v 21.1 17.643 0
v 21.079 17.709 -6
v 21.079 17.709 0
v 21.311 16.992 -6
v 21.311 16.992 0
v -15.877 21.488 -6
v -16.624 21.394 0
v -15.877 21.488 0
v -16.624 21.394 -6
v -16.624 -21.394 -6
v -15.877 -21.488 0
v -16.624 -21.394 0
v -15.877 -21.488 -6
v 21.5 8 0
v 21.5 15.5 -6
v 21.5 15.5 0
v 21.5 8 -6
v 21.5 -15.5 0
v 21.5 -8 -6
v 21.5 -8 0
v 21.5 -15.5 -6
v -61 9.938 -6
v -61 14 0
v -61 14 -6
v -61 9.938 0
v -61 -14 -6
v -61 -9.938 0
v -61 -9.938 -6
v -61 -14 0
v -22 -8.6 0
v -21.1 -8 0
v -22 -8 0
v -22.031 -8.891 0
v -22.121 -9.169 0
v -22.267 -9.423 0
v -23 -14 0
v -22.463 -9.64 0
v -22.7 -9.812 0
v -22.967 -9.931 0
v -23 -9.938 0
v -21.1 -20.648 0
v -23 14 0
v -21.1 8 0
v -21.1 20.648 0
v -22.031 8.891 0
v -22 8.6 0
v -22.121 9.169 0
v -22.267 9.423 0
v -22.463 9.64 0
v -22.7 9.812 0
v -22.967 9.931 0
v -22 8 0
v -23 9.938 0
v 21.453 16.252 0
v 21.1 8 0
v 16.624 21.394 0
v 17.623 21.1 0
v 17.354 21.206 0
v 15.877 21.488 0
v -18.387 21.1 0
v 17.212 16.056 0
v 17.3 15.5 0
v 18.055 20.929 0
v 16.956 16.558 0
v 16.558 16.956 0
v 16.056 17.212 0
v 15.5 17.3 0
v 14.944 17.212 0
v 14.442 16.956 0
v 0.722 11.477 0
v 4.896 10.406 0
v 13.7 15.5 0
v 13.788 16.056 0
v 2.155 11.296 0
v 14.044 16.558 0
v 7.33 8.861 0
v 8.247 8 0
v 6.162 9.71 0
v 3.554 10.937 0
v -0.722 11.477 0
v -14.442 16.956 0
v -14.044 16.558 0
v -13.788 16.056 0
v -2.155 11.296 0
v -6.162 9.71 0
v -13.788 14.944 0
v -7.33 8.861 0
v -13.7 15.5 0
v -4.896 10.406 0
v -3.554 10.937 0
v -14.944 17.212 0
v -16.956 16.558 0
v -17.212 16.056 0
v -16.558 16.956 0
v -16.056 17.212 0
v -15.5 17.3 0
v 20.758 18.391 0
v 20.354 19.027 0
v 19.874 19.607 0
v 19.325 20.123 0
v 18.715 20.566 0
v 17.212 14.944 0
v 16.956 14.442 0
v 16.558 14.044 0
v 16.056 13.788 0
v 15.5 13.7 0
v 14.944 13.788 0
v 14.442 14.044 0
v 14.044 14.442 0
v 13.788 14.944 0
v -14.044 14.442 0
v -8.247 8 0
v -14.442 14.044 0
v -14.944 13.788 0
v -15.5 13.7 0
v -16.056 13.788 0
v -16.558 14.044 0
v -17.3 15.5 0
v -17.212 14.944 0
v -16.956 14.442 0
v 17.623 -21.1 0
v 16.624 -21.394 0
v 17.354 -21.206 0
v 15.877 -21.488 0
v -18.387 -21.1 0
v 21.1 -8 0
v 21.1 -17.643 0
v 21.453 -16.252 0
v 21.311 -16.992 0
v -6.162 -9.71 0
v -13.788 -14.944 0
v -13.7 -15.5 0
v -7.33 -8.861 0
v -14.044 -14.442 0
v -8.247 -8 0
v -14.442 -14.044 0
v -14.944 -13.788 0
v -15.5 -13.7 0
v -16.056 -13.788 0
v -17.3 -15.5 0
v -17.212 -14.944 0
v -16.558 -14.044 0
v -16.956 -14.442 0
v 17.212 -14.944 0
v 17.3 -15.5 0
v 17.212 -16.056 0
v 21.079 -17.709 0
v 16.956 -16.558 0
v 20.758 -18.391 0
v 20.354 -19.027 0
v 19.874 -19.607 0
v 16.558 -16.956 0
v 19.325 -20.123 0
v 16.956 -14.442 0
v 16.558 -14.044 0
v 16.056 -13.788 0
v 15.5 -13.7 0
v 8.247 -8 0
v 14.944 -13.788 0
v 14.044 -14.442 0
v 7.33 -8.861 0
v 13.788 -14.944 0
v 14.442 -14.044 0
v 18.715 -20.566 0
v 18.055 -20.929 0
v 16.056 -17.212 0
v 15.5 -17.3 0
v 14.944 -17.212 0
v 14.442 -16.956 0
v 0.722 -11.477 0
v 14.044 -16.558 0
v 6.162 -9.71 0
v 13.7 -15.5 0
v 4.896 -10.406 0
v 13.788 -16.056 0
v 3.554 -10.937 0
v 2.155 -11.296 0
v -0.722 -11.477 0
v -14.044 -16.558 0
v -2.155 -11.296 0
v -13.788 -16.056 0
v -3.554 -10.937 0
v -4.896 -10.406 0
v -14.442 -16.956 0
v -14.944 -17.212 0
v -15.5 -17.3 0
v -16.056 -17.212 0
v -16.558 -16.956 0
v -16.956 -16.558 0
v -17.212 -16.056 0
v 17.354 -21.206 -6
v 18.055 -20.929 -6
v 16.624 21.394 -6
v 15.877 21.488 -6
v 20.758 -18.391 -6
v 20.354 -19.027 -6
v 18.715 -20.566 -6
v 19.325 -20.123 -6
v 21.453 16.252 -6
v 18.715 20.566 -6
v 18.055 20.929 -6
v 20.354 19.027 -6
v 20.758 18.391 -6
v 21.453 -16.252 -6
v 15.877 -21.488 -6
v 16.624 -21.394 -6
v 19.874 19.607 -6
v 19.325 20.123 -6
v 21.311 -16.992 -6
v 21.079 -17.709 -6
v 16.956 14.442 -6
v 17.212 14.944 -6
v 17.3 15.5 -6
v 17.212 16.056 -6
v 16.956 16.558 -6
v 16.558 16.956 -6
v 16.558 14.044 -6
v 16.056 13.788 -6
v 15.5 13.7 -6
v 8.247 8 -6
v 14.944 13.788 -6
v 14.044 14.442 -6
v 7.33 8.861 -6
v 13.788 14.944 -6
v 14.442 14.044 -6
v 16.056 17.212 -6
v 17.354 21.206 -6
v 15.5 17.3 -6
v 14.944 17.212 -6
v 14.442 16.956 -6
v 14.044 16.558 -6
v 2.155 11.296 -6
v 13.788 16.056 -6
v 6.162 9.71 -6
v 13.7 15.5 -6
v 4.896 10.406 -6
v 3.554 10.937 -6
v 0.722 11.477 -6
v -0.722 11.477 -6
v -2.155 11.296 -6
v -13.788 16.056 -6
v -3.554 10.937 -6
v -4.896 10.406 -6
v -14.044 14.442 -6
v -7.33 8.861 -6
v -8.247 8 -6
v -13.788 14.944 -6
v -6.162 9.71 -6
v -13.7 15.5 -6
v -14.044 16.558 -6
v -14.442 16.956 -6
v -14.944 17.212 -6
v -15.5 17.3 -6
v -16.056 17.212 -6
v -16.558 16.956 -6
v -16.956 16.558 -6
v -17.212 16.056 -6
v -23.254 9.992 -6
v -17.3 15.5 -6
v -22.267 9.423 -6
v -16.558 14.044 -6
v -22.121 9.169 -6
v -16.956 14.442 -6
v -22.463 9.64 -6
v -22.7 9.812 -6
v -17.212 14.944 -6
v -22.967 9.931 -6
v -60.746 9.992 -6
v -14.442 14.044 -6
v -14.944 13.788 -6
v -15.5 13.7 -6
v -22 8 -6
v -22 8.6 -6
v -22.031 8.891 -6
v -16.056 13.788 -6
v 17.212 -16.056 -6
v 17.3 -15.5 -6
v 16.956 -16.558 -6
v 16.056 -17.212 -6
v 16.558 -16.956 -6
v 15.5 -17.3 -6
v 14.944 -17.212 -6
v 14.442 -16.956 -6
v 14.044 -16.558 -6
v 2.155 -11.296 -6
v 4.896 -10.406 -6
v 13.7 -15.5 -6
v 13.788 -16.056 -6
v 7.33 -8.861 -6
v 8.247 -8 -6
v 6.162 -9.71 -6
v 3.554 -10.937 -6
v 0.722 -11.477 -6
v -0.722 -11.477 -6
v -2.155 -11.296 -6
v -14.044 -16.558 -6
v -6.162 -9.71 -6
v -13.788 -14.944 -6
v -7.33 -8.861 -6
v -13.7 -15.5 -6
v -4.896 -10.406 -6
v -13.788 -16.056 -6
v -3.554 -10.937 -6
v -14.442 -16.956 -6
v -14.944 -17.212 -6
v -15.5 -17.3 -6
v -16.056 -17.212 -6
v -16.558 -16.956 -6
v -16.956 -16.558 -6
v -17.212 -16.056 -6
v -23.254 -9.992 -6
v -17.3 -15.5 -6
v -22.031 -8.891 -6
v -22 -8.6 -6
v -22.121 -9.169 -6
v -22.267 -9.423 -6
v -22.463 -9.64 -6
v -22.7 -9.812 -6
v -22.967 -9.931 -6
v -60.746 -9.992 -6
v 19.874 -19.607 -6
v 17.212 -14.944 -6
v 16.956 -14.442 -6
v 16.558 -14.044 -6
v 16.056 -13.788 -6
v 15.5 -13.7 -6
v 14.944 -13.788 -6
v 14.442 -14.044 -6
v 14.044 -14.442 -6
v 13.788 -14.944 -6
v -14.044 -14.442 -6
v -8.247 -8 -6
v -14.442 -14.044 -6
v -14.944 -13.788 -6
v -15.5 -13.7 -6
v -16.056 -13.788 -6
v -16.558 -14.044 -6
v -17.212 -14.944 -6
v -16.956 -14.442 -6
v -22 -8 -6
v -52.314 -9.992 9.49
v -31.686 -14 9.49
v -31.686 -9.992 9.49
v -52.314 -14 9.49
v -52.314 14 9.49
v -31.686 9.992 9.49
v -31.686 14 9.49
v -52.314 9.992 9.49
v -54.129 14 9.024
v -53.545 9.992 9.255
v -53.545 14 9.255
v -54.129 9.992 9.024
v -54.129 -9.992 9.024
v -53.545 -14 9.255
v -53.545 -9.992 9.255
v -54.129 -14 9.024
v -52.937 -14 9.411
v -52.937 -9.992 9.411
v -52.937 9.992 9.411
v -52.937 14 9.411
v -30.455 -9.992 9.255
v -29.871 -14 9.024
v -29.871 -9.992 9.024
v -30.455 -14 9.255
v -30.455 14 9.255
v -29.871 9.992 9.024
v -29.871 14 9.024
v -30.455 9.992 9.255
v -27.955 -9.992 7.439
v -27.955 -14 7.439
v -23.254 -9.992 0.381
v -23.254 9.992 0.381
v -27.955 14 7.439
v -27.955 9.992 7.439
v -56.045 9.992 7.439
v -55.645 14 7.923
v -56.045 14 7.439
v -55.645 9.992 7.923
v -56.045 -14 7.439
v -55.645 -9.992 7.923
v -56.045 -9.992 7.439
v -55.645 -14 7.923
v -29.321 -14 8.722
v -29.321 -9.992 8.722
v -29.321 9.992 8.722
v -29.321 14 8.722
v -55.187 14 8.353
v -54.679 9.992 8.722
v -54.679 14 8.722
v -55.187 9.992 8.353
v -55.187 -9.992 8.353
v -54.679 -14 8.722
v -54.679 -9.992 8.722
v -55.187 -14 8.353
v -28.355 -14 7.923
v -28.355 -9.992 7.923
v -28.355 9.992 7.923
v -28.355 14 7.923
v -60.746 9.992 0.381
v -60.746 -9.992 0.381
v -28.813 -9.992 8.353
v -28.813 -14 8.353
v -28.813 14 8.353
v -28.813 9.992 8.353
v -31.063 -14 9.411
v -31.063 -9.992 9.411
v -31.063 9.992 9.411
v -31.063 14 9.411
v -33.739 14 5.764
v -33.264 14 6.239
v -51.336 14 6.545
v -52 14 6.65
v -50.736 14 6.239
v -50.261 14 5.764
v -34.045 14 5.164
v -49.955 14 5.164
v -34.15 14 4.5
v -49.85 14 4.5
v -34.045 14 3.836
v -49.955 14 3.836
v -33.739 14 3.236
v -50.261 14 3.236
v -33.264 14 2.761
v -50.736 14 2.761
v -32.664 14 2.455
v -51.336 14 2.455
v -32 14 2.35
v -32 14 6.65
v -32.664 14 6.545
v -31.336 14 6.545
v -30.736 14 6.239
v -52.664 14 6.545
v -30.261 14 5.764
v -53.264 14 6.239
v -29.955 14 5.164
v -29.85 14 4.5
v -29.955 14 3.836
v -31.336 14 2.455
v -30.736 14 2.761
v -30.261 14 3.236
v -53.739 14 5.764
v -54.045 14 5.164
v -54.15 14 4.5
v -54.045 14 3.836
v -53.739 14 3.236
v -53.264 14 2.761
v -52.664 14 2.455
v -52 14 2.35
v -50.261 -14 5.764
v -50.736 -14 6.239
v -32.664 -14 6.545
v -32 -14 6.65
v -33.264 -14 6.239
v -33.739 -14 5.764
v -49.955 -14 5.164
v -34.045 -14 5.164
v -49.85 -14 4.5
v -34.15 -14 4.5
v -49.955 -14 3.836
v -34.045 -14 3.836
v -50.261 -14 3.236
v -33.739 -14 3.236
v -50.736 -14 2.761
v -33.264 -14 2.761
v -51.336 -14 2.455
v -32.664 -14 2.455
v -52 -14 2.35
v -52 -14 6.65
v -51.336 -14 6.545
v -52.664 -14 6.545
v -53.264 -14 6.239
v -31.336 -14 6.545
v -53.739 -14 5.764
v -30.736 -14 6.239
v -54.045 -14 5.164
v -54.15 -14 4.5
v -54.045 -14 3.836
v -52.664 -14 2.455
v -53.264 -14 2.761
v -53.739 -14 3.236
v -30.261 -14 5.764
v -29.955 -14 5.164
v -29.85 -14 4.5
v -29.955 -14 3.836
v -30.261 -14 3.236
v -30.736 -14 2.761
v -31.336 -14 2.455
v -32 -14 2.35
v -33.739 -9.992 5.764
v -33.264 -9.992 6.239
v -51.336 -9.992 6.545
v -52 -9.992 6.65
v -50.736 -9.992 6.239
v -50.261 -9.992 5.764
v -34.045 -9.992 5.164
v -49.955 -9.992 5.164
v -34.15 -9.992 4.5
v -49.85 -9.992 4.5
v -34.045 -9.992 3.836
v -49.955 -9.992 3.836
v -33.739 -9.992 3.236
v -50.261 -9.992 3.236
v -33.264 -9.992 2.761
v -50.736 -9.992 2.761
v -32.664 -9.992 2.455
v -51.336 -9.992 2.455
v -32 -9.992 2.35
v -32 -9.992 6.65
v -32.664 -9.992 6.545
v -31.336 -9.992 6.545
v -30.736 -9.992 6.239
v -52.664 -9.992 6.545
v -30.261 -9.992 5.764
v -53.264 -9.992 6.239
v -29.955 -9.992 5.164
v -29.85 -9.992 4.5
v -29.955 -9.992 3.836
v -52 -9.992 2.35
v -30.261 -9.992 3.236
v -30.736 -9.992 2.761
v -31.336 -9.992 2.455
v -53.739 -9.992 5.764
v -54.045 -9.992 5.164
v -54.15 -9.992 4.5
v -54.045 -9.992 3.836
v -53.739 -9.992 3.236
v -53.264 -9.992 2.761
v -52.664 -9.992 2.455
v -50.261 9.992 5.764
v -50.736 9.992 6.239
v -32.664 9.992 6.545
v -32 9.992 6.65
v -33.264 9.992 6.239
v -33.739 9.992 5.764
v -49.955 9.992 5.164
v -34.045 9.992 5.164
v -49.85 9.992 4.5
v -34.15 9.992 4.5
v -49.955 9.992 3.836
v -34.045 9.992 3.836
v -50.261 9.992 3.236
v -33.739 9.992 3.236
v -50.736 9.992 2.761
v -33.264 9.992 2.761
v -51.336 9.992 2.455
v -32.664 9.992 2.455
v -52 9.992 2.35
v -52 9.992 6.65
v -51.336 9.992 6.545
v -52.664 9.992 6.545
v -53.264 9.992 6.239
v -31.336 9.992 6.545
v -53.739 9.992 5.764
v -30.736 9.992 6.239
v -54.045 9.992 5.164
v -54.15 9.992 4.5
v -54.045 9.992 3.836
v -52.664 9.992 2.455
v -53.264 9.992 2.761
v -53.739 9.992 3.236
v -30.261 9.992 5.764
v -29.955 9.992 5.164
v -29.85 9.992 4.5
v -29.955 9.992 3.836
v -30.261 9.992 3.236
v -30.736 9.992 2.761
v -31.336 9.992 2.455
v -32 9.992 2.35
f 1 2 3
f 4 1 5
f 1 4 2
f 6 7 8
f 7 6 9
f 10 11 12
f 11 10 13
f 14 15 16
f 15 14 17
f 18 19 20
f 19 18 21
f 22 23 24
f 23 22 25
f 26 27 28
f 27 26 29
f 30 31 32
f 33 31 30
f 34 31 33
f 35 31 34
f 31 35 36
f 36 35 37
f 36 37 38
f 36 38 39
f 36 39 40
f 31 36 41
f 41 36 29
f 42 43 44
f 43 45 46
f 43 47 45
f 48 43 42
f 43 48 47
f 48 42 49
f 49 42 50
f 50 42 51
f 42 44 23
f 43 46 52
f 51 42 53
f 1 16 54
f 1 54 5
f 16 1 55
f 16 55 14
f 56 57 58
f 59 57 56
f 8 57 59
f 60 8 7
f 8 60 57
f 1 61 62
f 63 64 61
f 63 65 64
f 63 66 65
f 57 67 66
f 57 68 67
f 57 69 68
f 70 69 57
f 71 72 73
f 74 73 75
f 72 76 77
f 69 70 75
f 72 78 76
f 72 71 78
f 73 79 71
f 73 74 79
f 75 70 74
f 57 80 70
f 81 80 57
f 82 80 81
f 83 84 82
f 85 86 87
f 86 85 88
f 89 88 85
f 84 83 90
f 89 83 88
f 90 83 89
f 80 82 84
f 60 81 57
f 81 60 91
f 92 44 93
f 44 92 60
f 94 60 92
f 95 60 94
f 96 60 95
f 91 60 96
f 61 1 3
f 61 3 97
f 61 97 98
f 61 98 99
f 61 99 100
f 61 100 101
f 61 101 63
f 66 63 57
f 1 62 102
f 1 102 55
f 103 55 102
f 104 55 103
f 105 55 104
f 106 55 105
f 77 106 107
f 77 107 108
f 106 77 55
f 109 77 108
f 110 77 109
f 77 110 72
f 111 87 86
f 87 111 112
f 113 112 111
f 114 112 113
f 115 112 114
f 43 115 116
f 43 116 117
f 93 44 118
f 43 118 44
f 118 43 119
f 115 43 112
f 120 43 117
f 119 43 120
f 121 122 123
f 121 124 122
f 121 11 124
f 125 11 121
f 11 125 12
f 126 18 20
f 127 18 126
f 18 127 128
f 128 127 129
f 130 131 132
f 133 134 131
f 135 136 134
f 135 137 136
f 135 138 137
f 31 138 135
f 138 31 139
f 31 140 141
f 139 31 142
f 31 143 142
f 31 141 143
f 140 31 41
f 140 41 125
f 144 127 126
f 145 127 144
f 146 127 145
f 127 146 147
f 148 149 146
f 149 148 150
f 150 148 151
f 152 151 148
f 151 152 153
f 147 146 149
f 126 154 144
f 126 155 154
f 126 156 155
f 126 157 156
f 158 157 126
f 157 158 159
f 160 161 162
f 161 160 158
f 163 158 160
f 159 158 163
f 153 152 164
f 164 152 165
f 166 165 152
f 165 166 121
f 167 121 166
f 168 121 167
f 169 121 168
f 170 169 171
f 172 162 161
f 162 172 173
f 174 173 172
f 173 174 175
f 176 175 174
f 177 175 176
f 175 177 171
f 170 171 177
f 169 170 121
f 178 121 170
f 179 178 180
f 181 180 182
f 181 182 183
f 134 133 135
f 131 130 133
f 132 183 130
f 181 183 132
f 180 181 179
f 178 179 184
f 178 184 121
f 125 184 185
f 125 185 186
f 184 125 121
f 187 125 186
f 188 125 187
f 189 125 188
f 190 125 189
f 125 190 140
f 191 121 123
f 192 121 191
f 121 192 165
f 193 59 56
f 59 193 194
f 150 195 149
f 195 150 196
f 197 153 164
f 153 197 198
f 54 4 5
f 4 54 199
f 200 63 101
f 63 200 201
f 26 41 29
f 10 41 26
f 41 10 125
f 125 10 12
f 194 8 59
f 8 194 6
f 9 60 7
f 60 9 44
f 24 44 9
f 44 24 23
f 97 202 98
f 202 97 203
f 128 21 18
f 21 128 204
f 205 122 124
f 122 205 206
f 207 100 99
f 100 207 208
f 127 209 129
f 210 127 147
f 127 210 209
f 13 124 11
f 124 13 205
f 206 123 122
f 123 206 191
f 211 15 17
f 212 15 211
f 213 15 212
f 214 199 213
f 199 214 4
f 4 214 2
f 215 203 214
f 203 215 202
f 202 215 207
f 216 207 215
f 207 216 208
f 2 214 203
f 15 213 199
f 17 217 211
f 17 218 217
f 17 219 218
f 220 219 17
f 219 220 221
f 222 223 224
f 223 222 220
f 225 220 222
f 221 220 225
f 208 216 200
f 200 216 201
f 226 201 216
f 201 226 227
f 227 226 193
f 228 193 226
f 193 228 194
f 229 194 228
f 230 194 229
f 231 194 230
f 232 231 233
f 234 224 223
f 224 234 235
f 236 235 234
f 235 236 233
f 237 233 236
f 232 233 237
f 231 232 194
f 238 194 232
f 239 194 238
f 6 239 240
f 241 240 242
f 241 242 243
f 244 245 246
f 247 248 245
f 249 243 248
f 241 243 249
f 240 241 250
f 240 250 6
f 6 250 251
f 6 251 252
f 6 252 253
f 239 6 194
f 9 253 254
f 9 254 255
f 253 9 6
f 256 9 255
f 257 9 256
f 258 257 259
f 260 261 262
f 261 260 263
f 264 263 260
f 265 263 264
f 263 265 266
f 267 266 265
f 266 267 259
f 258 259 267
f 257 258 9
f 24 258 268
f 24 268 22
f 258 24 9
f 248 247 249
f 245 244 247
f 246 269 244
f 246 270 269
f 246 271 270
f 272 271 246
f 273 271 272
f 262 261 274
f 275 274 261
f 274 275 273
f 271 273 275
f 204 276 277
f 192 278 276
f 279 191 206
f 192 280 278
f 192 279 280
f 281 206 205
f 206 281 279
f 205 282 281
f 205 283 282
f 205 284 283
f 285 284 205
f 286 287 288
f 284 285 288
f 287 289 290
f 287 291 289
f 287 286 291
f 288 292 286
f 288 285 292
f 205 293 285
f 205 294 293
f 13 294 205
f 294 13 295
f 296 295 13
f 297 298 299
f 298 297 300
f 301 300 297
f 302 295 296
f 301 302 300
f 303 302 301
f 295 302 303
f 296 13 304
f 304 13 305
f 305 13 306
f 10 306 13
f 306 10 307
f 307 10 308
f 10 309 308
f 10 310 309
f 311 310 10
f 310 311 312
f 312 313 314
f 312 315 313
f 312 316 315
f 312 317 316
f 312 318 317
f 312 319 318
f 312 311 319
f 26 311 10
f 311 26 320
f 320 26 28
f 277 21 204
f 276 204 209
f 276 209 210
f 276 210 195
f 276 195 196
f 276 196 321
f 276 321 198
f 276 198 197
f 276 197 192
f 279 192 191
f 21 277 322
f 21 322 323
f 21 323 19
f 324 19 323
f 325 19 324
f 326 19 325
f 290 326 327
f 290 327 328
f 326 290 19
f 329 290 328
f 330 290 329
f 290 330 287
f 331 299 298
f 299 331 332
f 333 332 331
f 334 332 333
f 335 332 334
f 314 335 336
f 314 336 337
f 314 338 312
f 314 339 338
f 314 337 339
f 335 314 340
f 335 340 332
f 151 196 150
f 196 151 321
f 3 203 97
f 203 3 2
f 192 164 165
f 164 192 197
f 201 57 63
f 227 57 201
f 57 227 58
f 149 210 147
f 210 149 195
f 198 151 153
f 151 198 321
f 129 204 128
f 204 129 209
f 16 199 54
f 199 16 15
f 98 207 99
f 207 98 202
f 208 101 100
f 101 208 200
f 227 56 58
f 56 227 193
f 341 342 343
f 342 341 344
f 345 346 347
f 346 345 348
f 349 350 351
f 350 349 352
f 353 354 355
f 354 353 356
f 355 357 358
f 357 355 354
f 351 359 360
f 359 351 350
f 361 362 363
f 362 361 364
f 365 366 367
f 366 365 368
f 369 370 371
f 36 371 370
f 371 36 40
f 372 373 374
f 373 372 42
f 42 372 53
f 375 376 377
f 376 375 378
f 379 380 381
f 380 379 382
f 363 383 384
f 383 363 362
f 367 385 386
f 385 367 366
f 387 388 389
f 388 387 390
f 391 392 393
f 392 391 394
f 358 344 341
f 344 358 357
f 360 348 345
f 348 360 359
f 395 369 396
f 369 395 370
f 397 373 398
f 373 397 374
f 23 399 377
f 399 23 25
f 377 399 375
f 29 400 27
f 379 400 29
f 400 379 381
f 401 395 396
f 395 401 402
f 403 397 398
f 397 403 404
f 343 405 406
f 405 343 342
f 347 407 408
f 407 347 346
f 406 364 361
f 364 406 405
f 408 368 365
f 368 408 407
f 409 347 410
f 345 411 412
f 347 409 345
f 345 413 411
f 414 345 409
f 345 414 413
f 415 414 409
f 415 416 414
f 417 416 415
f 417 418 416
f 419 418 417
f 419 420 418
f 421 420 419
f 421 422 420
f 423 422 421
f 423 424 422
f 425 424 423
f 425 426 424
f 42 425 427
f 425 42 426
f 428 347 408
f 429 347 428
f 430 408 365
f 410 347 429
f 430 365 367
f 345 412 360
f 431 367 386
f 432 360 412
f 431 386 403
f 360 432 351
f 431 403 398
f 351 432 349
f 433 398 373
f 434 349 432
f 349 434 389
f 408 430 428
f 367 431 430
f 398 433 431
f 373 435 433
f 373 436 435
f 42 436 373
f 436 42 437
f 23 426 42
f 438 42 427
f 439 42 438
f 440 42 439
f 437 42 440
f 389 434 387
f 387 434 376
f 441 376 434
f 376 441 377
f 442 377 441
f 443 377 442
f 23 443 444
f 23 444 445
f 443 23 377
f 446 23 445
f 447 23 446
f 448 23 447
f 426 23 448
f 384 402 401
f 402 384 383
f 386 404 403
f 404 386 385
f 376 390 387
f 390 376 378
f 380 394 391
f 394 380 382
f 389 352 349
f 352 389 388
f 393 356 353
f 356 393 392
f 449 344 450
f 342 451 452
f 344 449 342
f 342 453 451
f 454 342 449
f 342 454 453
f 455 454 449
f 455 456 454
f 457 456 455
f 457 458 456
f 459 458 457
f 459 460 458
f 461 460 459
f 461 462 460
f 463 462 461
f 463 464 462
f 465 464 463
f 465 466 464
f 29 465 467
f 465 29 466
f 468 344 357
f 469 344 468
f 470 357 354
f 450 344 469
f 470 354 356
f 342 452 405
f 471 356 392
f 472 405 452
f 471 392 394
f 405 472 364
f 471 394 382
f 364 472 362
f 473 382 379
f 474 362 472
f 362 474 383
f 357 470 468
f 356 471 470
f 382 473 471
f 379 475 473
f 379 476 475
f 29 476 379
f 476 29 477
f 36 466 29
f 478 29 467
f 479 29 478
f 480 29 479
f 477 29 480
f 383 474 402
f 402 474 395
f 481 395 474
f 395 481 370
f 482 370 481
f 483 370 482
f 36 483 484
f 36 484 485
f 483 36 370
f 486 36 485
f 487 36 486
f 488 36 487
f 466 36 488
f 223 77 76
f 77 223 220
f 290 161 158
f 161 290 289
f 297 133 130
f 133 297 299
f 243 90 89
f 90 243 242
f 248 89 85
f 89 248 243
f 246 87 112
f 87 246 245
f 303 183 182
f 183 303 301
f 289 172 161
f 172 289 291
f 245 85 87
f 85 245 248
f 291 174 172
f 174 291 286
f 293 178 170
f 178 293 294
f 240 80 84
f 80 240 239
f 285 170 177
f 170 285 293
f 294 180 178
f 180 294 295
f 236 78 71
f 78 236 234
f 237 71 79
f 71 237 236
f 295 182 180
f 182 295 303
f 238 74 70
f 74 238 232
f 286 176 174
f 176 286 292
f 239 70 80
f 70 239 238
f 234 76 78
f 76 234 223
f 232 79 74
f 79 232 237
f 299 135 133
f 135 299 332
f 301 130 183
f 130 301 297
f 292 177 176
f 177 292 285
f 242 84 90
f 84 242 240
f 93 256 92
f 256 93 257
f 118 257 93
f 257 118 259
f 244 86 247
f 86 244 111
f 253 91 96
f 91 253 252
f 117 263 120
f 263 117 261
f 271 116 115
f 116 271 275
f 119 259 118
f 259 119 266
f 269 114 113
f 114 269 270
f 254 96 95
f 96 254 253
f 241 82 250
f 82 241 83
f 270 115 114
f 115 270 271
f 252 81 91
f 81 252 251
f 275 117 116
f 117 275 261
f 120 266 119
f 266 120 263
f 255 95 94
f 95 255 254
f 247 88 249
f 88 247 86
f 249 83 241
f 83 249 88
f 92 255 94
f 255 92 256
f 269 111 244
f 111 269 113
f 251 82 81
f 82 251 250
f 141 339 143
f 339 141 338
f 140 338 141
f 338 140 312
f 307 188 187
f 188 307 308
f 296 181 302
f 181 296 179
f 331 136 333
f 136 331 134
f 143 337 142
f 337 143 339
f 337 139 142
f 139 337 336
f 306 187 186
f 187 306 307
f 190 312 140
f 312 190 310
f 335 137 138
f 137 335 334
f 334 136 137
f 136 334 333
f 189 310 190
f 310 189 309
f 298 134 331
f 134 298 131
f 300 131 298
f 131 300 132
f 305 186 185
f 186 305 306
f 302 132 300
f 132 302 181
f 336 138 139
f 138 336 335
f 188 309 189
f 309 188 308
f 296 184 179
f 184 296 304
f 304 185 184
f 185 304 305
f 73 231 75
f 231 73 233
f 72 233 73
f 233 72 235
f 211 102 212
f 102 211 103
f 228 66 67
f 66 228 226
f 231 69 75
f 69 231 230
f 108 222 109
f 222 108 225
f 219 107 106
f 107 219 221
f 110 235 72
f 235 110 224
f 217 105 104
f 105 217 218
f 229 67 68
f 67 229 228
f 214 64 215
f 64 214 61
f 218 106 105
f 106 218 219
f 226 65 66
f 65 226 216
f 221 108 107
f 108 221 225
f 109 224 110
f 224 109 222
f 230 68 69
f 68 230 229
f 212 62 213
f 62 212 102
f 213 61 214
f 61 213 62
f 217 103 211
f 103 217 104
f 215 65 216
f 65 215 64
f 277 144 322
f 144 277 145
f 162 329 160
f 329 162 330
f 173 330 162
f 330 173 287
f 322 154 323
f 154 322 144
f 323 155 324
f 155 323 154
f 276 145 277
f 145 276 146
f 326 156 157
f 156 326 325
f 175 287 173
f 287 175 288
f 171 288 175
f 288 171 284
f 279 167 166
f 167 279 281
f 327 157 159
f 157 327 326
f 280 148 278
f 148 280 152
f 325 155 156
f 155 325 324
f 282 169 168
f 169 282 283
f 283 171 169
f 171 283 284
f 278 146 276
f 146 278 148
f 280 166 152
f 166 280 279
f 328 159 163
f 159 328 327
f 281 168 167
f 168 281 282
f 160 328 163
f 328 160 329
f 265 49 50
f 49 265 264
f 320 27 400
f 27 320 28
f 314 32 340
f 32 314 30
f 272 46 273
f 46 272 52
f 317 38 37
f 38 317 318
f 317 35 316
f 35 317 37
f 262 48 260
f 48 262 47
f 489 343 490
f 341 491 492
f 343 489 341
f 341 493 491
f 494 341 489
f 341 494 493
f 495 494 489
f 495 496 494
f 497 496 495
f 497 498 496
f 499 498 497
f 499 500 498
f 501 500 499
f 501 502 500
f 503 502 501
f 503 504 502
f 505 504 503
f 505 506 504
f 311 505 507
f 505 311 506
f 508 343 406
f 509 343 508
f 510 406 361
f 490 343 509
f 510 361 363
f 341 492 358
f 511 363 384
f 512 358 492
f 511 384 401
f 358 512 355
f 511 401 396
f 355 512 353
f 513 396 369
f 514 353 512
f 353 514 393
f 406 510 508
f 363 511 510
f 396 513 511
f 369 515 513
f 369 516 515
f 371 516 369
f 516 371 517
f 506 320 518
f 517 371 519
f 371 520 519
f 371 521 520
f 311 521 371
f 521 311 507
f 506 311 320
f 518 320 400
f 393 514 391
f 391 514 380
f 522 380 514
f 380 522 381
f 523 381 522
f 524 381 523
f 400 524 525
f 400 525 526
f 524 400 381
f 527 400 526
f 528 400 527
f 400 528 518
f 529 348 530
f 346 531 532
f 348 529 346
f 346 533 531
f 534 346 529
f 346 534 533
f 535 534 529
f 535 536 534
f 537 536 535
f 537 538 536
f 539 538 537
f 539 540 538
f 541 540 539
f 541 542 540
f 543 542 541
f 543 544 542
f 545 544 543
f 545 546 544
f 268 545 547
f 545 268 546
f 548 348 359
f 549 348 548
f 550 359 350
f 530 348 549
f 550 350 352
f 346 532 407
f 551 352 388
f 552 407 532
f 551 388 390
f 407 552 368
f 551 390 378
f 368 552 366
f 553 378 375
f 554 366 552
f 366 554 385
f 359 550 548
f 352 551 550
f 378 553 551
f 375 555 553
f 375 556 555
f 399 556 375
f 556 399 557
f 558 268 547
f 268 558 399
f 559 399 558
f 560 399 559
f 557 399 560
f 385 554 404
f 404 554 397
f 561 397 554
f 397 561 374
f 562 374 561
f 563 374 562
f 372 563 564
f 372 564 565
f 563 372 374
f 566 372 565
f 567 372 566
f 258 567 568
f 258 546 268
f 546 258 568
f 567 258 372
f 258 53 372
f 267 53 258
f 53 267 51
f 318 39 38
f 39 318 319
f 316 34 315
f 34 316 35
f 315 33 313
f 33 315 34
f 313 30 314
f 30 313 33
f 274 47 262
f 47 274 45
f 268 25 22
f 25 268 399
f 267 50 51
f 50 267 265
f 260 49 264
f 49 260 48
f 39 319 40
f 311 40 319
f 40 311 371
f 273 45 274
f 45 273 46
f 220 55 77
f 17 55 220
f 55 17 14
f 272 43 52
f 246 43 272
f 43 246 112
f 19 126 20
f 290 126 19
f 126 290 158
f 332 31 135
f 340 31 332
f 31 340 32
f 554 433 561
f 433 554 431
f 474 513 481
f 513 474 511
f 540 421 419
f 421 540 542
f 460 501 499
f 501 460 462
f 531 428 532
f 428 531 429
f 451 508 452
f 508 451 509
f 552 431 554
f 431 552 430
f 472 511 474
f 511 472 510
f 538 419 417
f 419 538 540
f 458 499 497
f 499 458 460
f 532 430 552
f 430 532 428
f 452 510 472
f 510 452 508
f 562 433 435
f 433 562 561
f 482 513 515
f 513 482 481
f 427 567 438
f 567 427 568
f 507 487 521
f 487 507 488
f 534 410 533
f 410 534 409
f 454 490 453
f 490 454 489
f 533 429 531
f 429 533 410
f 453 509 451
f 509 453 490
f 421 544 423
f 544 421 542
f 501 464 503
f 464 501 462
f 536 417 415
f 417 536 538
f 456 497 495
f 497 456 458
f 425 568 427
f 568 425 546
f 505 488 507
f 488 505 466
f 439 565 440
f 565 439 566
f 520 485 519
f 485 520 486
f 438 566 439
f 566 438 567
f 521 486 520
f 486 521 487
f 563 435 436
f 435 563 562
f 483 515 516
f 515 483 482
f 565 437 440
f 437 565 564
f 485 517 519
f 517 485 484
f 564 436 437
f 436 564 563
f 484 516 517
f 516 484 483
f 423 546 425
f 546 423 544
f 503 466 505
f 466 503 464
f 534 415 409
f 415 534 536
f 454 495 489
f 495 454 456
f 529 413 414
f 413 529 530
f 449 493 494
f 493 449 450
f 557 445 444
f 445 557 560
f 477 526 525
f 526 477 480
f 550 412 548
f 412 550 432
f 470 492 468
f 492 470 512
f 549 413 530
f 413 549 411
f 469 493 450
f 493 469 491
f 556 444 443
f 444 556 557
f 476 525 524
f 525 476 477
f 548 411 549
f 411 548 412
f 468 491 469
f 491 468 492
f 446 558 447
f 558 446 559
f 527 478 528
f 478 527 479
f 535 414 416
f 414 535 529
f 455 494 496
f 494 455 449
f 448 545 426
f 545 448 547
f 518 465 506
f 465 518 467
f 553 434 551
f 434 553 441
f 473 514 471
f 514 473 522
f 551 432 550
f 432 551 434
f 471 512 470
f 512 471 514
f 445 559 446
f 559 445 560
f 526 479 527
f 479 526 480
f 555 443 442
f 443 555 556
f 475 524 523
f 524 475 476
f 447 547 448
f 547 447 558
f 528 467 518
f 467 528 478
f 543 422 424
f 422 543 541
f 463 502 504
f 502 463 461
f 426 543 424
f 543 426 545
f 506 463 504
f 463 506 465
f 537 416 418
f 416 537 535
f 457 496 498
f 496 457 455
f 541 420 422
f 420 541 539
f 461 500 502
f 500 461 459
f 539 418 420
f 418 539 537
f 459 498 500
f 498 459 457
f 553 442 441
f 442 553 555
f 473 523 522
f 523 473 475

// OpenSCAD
// file: ../components/nema17.scad
module nema17(clearance = 0){
	if(clearance > 0){
		translate([0,0,-24]) cube([42.2,42.2,48],center=true);
		cylinder(r=11.5,h=20,$fn=50,center=true);
		cylinder(r=3,h=60,$fn=50,center=true);

		translate([15.5,15.5,0]) cylinder(r=1.8,h=20,center=true,$fn=20);
		translate([15.5,-15.5,0]) cylinder(r=1.8,h=20,center=true,$fn=20);
		translate([-15.5,15.5,0]) cylinder(r=1.8,h=20,center=true,$fn=20);
		translate([-15.5,-15.5,0]) cylinder(r=1.8,h=20,center=true,$fn=20);
	} else {
	color("Black") 
		difference(){
			translate([0,0,-24]) cube([42.2,42.2,38],center=true);
			rotate([0,0,45]) translate([31,0,-24]) cube([10,20,50],center=true);
			rotate([0,0,135]) translate([31,0,-24]) cube([10,20,50],center=true);
			rotate([0,0,-45]) translate([31,0,-24]) cube([10,20,50],center=true);
			rotate([0,0,-135]) translate([31,0,-24]) cube([10,20,50],center=true);
		}
	color("Silver") 
		difference(){
			union(){
				translate([0,0,-4.5]) cube([42.3,42.3,9],center=true);
				translate([0,0,-43.5]) cube([42.3,42.3,9],center=true);
			}
			rotate([0,0,45]) translate([33,0,-24]) cube([10,20,50],center=true);
			rotate([0,0,135]) translate([33,0,-24]) cube([10,20,50],center=true);
			rotate([0,0,-45]) translate([33,0,-24]) cube([10,20,50],center=true);
			rotate([0,0,-135]) translate([33,0,-24]) cube([10,20,50],center=true);

			translate([15.5,15.5,0]) cylinder(r=1.5,h=8,center=true,$fn=20);
			translate([15.5,-15.5,0]) cylinder(r=1.5,h=8,center=true,$fn=20);
			translate([-15.5,15.5,0]) cylinder(r=1.5,h=8,center=true,$fn=20);
			translate([-15.5,-15.5,0]) cylinder(r=1.5,h=8,center=true,$fn=20);
		}

	color("Silver") cylinder(r=11,h=4,$fn=50,center=true);

	color("Silver") 
		hull(){
			cylinder(r=2.5,h=48,$fn=50,center=true);
			cylinder(r=2,h=49,$fn=50,center=true);	
		}
	}
}
// file: ../components/2040.scad
module outer_shape(h=10){
	hull(){
		translate([18.6,8.6,-h/2]) cylinder(r=1.4,h=h,$fn=30);
		translate([18.6,-8.6,-h/2]) cylinder(r=1.4,h=h,$fn=30);
		translate([-18.6,8.6,-h/2]) cylinder(r=1.4,h=h,$fn=30);
		translate([-18.6,-8.6,-h/2]) cylinder(r=1.4,h=h,$fn=30);
	}
}

module extrusion_2040(h=10){
	difference(){
		union(){
			difference(){
				outer_shape(h=h);
				cube([37.2,17.2,h+0.1],center=true);
				
				// Nut
				cube([40.1,6,h+0.1],center=true);
				translate([10,0,0]) cube([6,20.1,h+0.1],center=true);
				translate([-10,0,0]) cube([6,20.1,h+0.1],center=true);

				// Nut Wide
				translate([-19.9,0,0])cube([0.5,6.8,h+0.1],center=true);
				translate([19.9,0,0])cube([0.5,6.8,h+0.1],center=true);
				translate([10,-9.9,0])cube([6.8,0.5,h+0.1],center=true);
				translate([10,9.9,0])cube([6.8,0.5,h+0.1],center=true);
				translate([-10,-9.9,0])cube([6.8,0.5,h+0.1],center=true);
				translate([-10,9.9,0])cube([6.8,0.5,h+0.1],center=true);
			}
			// Cross
			translate([-10,0,0]) rotate([0,0,45]) cube([26,1.5,h],center=true);
			translate([-10,0,0]) rotate([0,0,-45]) cube([26,1.5,h],center=true);
			translate([10,0,0]) rotate([0,0,45]) cube([26,1.5,h],center=true);
			translate([10,0,0]) rotate([0,0,-45]) cube([26,1.5,h],center=true);
			
			//Corner Cubes
			intersection(){
				union(){
					translate([18,8,0]) cube([4,4,h],center=true);
					translate([18,-8,0]) cube([4,4,h],center=true);
					translate([-18,8,0]) cube([4,4,h],center=true);
					translate([-18,-8,0]) cube([4,4,h],center=true);

					translate([2,8.5,0]) cube([4,3.5,h],center=true);
					translate([2,-8.5,0]) cube([4,3.5,h],center=true);
					translate([-2,8.5,0]) cube([4,3.5,h],center=true);
					translate([-2,-8.5,0]) cube([4,3.5,h],center=true);

				}
				outer_shape();
			}

			// Center Cube
			translate([10,0,0]) cube([9,9,h],center=true);
			translate([-10,0,0]) cube([9,9,h],center=true);
		}
		translate([10,0,-h/2-1]) cylinder(h+2,2.5,2.5,$fn=30);
		translate([-10,0,-h/2-1]) cylinder(h+2,2.5,2.5,$fn=30);
		cube([5,17,h+2],center=true);
	}


}

module beam_2040(h=10,clearance = 0){
	if(clearance > 0){
		outer_shape(h=h);
	} else {
		extrusion_2040(h);
	}
}
// file: configuration.scad
// OD = outside diameter, corner to corner.
m3_nut_od = 6.1;
m3_nut_radius = (m3_nut_od+0.2)/2;

m4_nut_od = 8.1;
m4_nut_radius = (m4_nut_od+0.2)/2;

// Major diameter of metric 3mm thread.
m3_major = 2.85;
m3_radius = m3_major/2;
m3_open_radius = 3.2/2;

m4_major = 3.85;
m4_radius = m4_major/2;
m4_open_radius = 4.3/2;

m8_major = 7.85;
m8_radius = m8_major/2;
m8_open_radius = 8.3/2;

// NEMA17 stepper motors.
motor_shaft_diameter = 5;
motor_shaft_radius = (motor_shaft_diameter+0.3)/2;

// Frame brackets.
thickness = 3.6;

tower_radius = 185;
tower_side = tower_radius*1.73205;
tower_h = tower_radius*1.5;
tower_height = 1000;
bearing_spacing = 39.8;
horizontal_beam_radius = (tower_radius+28.8)/2;
horizontal_beam_length = horizontal_beam_radius * 3.464101615138 - (41.35*2);

color_a = "GreenYellow";
color_b = "black";
color_c = "";
color_d = "Silver";
// main file
include <configuration.scad>
include <../components/2040.scad>
include <../components/nema17.scad>


module motor_mount(){
	difference(){
		union(){
			hull(){
				translate([15.5,15.5,3]) cylinder(r=6,h=6,center=true,$fn=50);
				translate([15.5,-15.5,3]) cylinder(r=6,h=6,center=true,$fn=50);
				translate([-15.5,15.5,3]) cylinder(r=6,h=6,center=true,$fn=50);
				translate([-15.5,-15.5,3]) cylinder(r=6,h=6,center=true,$fn=50);
				translate([42,12,3]) cube([38,4,6],center=true);
				translate([42,-12,3]) cube([38,4,6],center=true);
			}
			hull(){
				translate([32,0,-4.5]) rotate([90,0,0]) cylinder(28,5,5,$fn=50,center=true);
				translate([52,0,-4.5]) rotate([90,0,0]) cylinder(28,5,5,$fn=50,center=true);
				translate([42,0,1]) cube([38,28,2],center=true);
			}
		}
		nema17(clearance=1);
		translate([42,0,0]) beam_2040(h=160, clearance=1);
		translate([0,0,0]) cube([200,16,20],center=true);

		translate([32,0,-4.5]) rotate([90,0,0]) cylinder(100,m4_open_radius,m4_open_radius,$fn=20,center=true);
		translate([52,0,-4.5]) rotate([90,0,0]) cylinder(100,m4_open_radius,m4_open_radius,$fn=20,center=true);
	}
}
rotate([0,180,0]) motor_mount();
//motor_mount();
%nema17();
%color("Silver") translate([42,0,0]) beam_2040(h=160);
